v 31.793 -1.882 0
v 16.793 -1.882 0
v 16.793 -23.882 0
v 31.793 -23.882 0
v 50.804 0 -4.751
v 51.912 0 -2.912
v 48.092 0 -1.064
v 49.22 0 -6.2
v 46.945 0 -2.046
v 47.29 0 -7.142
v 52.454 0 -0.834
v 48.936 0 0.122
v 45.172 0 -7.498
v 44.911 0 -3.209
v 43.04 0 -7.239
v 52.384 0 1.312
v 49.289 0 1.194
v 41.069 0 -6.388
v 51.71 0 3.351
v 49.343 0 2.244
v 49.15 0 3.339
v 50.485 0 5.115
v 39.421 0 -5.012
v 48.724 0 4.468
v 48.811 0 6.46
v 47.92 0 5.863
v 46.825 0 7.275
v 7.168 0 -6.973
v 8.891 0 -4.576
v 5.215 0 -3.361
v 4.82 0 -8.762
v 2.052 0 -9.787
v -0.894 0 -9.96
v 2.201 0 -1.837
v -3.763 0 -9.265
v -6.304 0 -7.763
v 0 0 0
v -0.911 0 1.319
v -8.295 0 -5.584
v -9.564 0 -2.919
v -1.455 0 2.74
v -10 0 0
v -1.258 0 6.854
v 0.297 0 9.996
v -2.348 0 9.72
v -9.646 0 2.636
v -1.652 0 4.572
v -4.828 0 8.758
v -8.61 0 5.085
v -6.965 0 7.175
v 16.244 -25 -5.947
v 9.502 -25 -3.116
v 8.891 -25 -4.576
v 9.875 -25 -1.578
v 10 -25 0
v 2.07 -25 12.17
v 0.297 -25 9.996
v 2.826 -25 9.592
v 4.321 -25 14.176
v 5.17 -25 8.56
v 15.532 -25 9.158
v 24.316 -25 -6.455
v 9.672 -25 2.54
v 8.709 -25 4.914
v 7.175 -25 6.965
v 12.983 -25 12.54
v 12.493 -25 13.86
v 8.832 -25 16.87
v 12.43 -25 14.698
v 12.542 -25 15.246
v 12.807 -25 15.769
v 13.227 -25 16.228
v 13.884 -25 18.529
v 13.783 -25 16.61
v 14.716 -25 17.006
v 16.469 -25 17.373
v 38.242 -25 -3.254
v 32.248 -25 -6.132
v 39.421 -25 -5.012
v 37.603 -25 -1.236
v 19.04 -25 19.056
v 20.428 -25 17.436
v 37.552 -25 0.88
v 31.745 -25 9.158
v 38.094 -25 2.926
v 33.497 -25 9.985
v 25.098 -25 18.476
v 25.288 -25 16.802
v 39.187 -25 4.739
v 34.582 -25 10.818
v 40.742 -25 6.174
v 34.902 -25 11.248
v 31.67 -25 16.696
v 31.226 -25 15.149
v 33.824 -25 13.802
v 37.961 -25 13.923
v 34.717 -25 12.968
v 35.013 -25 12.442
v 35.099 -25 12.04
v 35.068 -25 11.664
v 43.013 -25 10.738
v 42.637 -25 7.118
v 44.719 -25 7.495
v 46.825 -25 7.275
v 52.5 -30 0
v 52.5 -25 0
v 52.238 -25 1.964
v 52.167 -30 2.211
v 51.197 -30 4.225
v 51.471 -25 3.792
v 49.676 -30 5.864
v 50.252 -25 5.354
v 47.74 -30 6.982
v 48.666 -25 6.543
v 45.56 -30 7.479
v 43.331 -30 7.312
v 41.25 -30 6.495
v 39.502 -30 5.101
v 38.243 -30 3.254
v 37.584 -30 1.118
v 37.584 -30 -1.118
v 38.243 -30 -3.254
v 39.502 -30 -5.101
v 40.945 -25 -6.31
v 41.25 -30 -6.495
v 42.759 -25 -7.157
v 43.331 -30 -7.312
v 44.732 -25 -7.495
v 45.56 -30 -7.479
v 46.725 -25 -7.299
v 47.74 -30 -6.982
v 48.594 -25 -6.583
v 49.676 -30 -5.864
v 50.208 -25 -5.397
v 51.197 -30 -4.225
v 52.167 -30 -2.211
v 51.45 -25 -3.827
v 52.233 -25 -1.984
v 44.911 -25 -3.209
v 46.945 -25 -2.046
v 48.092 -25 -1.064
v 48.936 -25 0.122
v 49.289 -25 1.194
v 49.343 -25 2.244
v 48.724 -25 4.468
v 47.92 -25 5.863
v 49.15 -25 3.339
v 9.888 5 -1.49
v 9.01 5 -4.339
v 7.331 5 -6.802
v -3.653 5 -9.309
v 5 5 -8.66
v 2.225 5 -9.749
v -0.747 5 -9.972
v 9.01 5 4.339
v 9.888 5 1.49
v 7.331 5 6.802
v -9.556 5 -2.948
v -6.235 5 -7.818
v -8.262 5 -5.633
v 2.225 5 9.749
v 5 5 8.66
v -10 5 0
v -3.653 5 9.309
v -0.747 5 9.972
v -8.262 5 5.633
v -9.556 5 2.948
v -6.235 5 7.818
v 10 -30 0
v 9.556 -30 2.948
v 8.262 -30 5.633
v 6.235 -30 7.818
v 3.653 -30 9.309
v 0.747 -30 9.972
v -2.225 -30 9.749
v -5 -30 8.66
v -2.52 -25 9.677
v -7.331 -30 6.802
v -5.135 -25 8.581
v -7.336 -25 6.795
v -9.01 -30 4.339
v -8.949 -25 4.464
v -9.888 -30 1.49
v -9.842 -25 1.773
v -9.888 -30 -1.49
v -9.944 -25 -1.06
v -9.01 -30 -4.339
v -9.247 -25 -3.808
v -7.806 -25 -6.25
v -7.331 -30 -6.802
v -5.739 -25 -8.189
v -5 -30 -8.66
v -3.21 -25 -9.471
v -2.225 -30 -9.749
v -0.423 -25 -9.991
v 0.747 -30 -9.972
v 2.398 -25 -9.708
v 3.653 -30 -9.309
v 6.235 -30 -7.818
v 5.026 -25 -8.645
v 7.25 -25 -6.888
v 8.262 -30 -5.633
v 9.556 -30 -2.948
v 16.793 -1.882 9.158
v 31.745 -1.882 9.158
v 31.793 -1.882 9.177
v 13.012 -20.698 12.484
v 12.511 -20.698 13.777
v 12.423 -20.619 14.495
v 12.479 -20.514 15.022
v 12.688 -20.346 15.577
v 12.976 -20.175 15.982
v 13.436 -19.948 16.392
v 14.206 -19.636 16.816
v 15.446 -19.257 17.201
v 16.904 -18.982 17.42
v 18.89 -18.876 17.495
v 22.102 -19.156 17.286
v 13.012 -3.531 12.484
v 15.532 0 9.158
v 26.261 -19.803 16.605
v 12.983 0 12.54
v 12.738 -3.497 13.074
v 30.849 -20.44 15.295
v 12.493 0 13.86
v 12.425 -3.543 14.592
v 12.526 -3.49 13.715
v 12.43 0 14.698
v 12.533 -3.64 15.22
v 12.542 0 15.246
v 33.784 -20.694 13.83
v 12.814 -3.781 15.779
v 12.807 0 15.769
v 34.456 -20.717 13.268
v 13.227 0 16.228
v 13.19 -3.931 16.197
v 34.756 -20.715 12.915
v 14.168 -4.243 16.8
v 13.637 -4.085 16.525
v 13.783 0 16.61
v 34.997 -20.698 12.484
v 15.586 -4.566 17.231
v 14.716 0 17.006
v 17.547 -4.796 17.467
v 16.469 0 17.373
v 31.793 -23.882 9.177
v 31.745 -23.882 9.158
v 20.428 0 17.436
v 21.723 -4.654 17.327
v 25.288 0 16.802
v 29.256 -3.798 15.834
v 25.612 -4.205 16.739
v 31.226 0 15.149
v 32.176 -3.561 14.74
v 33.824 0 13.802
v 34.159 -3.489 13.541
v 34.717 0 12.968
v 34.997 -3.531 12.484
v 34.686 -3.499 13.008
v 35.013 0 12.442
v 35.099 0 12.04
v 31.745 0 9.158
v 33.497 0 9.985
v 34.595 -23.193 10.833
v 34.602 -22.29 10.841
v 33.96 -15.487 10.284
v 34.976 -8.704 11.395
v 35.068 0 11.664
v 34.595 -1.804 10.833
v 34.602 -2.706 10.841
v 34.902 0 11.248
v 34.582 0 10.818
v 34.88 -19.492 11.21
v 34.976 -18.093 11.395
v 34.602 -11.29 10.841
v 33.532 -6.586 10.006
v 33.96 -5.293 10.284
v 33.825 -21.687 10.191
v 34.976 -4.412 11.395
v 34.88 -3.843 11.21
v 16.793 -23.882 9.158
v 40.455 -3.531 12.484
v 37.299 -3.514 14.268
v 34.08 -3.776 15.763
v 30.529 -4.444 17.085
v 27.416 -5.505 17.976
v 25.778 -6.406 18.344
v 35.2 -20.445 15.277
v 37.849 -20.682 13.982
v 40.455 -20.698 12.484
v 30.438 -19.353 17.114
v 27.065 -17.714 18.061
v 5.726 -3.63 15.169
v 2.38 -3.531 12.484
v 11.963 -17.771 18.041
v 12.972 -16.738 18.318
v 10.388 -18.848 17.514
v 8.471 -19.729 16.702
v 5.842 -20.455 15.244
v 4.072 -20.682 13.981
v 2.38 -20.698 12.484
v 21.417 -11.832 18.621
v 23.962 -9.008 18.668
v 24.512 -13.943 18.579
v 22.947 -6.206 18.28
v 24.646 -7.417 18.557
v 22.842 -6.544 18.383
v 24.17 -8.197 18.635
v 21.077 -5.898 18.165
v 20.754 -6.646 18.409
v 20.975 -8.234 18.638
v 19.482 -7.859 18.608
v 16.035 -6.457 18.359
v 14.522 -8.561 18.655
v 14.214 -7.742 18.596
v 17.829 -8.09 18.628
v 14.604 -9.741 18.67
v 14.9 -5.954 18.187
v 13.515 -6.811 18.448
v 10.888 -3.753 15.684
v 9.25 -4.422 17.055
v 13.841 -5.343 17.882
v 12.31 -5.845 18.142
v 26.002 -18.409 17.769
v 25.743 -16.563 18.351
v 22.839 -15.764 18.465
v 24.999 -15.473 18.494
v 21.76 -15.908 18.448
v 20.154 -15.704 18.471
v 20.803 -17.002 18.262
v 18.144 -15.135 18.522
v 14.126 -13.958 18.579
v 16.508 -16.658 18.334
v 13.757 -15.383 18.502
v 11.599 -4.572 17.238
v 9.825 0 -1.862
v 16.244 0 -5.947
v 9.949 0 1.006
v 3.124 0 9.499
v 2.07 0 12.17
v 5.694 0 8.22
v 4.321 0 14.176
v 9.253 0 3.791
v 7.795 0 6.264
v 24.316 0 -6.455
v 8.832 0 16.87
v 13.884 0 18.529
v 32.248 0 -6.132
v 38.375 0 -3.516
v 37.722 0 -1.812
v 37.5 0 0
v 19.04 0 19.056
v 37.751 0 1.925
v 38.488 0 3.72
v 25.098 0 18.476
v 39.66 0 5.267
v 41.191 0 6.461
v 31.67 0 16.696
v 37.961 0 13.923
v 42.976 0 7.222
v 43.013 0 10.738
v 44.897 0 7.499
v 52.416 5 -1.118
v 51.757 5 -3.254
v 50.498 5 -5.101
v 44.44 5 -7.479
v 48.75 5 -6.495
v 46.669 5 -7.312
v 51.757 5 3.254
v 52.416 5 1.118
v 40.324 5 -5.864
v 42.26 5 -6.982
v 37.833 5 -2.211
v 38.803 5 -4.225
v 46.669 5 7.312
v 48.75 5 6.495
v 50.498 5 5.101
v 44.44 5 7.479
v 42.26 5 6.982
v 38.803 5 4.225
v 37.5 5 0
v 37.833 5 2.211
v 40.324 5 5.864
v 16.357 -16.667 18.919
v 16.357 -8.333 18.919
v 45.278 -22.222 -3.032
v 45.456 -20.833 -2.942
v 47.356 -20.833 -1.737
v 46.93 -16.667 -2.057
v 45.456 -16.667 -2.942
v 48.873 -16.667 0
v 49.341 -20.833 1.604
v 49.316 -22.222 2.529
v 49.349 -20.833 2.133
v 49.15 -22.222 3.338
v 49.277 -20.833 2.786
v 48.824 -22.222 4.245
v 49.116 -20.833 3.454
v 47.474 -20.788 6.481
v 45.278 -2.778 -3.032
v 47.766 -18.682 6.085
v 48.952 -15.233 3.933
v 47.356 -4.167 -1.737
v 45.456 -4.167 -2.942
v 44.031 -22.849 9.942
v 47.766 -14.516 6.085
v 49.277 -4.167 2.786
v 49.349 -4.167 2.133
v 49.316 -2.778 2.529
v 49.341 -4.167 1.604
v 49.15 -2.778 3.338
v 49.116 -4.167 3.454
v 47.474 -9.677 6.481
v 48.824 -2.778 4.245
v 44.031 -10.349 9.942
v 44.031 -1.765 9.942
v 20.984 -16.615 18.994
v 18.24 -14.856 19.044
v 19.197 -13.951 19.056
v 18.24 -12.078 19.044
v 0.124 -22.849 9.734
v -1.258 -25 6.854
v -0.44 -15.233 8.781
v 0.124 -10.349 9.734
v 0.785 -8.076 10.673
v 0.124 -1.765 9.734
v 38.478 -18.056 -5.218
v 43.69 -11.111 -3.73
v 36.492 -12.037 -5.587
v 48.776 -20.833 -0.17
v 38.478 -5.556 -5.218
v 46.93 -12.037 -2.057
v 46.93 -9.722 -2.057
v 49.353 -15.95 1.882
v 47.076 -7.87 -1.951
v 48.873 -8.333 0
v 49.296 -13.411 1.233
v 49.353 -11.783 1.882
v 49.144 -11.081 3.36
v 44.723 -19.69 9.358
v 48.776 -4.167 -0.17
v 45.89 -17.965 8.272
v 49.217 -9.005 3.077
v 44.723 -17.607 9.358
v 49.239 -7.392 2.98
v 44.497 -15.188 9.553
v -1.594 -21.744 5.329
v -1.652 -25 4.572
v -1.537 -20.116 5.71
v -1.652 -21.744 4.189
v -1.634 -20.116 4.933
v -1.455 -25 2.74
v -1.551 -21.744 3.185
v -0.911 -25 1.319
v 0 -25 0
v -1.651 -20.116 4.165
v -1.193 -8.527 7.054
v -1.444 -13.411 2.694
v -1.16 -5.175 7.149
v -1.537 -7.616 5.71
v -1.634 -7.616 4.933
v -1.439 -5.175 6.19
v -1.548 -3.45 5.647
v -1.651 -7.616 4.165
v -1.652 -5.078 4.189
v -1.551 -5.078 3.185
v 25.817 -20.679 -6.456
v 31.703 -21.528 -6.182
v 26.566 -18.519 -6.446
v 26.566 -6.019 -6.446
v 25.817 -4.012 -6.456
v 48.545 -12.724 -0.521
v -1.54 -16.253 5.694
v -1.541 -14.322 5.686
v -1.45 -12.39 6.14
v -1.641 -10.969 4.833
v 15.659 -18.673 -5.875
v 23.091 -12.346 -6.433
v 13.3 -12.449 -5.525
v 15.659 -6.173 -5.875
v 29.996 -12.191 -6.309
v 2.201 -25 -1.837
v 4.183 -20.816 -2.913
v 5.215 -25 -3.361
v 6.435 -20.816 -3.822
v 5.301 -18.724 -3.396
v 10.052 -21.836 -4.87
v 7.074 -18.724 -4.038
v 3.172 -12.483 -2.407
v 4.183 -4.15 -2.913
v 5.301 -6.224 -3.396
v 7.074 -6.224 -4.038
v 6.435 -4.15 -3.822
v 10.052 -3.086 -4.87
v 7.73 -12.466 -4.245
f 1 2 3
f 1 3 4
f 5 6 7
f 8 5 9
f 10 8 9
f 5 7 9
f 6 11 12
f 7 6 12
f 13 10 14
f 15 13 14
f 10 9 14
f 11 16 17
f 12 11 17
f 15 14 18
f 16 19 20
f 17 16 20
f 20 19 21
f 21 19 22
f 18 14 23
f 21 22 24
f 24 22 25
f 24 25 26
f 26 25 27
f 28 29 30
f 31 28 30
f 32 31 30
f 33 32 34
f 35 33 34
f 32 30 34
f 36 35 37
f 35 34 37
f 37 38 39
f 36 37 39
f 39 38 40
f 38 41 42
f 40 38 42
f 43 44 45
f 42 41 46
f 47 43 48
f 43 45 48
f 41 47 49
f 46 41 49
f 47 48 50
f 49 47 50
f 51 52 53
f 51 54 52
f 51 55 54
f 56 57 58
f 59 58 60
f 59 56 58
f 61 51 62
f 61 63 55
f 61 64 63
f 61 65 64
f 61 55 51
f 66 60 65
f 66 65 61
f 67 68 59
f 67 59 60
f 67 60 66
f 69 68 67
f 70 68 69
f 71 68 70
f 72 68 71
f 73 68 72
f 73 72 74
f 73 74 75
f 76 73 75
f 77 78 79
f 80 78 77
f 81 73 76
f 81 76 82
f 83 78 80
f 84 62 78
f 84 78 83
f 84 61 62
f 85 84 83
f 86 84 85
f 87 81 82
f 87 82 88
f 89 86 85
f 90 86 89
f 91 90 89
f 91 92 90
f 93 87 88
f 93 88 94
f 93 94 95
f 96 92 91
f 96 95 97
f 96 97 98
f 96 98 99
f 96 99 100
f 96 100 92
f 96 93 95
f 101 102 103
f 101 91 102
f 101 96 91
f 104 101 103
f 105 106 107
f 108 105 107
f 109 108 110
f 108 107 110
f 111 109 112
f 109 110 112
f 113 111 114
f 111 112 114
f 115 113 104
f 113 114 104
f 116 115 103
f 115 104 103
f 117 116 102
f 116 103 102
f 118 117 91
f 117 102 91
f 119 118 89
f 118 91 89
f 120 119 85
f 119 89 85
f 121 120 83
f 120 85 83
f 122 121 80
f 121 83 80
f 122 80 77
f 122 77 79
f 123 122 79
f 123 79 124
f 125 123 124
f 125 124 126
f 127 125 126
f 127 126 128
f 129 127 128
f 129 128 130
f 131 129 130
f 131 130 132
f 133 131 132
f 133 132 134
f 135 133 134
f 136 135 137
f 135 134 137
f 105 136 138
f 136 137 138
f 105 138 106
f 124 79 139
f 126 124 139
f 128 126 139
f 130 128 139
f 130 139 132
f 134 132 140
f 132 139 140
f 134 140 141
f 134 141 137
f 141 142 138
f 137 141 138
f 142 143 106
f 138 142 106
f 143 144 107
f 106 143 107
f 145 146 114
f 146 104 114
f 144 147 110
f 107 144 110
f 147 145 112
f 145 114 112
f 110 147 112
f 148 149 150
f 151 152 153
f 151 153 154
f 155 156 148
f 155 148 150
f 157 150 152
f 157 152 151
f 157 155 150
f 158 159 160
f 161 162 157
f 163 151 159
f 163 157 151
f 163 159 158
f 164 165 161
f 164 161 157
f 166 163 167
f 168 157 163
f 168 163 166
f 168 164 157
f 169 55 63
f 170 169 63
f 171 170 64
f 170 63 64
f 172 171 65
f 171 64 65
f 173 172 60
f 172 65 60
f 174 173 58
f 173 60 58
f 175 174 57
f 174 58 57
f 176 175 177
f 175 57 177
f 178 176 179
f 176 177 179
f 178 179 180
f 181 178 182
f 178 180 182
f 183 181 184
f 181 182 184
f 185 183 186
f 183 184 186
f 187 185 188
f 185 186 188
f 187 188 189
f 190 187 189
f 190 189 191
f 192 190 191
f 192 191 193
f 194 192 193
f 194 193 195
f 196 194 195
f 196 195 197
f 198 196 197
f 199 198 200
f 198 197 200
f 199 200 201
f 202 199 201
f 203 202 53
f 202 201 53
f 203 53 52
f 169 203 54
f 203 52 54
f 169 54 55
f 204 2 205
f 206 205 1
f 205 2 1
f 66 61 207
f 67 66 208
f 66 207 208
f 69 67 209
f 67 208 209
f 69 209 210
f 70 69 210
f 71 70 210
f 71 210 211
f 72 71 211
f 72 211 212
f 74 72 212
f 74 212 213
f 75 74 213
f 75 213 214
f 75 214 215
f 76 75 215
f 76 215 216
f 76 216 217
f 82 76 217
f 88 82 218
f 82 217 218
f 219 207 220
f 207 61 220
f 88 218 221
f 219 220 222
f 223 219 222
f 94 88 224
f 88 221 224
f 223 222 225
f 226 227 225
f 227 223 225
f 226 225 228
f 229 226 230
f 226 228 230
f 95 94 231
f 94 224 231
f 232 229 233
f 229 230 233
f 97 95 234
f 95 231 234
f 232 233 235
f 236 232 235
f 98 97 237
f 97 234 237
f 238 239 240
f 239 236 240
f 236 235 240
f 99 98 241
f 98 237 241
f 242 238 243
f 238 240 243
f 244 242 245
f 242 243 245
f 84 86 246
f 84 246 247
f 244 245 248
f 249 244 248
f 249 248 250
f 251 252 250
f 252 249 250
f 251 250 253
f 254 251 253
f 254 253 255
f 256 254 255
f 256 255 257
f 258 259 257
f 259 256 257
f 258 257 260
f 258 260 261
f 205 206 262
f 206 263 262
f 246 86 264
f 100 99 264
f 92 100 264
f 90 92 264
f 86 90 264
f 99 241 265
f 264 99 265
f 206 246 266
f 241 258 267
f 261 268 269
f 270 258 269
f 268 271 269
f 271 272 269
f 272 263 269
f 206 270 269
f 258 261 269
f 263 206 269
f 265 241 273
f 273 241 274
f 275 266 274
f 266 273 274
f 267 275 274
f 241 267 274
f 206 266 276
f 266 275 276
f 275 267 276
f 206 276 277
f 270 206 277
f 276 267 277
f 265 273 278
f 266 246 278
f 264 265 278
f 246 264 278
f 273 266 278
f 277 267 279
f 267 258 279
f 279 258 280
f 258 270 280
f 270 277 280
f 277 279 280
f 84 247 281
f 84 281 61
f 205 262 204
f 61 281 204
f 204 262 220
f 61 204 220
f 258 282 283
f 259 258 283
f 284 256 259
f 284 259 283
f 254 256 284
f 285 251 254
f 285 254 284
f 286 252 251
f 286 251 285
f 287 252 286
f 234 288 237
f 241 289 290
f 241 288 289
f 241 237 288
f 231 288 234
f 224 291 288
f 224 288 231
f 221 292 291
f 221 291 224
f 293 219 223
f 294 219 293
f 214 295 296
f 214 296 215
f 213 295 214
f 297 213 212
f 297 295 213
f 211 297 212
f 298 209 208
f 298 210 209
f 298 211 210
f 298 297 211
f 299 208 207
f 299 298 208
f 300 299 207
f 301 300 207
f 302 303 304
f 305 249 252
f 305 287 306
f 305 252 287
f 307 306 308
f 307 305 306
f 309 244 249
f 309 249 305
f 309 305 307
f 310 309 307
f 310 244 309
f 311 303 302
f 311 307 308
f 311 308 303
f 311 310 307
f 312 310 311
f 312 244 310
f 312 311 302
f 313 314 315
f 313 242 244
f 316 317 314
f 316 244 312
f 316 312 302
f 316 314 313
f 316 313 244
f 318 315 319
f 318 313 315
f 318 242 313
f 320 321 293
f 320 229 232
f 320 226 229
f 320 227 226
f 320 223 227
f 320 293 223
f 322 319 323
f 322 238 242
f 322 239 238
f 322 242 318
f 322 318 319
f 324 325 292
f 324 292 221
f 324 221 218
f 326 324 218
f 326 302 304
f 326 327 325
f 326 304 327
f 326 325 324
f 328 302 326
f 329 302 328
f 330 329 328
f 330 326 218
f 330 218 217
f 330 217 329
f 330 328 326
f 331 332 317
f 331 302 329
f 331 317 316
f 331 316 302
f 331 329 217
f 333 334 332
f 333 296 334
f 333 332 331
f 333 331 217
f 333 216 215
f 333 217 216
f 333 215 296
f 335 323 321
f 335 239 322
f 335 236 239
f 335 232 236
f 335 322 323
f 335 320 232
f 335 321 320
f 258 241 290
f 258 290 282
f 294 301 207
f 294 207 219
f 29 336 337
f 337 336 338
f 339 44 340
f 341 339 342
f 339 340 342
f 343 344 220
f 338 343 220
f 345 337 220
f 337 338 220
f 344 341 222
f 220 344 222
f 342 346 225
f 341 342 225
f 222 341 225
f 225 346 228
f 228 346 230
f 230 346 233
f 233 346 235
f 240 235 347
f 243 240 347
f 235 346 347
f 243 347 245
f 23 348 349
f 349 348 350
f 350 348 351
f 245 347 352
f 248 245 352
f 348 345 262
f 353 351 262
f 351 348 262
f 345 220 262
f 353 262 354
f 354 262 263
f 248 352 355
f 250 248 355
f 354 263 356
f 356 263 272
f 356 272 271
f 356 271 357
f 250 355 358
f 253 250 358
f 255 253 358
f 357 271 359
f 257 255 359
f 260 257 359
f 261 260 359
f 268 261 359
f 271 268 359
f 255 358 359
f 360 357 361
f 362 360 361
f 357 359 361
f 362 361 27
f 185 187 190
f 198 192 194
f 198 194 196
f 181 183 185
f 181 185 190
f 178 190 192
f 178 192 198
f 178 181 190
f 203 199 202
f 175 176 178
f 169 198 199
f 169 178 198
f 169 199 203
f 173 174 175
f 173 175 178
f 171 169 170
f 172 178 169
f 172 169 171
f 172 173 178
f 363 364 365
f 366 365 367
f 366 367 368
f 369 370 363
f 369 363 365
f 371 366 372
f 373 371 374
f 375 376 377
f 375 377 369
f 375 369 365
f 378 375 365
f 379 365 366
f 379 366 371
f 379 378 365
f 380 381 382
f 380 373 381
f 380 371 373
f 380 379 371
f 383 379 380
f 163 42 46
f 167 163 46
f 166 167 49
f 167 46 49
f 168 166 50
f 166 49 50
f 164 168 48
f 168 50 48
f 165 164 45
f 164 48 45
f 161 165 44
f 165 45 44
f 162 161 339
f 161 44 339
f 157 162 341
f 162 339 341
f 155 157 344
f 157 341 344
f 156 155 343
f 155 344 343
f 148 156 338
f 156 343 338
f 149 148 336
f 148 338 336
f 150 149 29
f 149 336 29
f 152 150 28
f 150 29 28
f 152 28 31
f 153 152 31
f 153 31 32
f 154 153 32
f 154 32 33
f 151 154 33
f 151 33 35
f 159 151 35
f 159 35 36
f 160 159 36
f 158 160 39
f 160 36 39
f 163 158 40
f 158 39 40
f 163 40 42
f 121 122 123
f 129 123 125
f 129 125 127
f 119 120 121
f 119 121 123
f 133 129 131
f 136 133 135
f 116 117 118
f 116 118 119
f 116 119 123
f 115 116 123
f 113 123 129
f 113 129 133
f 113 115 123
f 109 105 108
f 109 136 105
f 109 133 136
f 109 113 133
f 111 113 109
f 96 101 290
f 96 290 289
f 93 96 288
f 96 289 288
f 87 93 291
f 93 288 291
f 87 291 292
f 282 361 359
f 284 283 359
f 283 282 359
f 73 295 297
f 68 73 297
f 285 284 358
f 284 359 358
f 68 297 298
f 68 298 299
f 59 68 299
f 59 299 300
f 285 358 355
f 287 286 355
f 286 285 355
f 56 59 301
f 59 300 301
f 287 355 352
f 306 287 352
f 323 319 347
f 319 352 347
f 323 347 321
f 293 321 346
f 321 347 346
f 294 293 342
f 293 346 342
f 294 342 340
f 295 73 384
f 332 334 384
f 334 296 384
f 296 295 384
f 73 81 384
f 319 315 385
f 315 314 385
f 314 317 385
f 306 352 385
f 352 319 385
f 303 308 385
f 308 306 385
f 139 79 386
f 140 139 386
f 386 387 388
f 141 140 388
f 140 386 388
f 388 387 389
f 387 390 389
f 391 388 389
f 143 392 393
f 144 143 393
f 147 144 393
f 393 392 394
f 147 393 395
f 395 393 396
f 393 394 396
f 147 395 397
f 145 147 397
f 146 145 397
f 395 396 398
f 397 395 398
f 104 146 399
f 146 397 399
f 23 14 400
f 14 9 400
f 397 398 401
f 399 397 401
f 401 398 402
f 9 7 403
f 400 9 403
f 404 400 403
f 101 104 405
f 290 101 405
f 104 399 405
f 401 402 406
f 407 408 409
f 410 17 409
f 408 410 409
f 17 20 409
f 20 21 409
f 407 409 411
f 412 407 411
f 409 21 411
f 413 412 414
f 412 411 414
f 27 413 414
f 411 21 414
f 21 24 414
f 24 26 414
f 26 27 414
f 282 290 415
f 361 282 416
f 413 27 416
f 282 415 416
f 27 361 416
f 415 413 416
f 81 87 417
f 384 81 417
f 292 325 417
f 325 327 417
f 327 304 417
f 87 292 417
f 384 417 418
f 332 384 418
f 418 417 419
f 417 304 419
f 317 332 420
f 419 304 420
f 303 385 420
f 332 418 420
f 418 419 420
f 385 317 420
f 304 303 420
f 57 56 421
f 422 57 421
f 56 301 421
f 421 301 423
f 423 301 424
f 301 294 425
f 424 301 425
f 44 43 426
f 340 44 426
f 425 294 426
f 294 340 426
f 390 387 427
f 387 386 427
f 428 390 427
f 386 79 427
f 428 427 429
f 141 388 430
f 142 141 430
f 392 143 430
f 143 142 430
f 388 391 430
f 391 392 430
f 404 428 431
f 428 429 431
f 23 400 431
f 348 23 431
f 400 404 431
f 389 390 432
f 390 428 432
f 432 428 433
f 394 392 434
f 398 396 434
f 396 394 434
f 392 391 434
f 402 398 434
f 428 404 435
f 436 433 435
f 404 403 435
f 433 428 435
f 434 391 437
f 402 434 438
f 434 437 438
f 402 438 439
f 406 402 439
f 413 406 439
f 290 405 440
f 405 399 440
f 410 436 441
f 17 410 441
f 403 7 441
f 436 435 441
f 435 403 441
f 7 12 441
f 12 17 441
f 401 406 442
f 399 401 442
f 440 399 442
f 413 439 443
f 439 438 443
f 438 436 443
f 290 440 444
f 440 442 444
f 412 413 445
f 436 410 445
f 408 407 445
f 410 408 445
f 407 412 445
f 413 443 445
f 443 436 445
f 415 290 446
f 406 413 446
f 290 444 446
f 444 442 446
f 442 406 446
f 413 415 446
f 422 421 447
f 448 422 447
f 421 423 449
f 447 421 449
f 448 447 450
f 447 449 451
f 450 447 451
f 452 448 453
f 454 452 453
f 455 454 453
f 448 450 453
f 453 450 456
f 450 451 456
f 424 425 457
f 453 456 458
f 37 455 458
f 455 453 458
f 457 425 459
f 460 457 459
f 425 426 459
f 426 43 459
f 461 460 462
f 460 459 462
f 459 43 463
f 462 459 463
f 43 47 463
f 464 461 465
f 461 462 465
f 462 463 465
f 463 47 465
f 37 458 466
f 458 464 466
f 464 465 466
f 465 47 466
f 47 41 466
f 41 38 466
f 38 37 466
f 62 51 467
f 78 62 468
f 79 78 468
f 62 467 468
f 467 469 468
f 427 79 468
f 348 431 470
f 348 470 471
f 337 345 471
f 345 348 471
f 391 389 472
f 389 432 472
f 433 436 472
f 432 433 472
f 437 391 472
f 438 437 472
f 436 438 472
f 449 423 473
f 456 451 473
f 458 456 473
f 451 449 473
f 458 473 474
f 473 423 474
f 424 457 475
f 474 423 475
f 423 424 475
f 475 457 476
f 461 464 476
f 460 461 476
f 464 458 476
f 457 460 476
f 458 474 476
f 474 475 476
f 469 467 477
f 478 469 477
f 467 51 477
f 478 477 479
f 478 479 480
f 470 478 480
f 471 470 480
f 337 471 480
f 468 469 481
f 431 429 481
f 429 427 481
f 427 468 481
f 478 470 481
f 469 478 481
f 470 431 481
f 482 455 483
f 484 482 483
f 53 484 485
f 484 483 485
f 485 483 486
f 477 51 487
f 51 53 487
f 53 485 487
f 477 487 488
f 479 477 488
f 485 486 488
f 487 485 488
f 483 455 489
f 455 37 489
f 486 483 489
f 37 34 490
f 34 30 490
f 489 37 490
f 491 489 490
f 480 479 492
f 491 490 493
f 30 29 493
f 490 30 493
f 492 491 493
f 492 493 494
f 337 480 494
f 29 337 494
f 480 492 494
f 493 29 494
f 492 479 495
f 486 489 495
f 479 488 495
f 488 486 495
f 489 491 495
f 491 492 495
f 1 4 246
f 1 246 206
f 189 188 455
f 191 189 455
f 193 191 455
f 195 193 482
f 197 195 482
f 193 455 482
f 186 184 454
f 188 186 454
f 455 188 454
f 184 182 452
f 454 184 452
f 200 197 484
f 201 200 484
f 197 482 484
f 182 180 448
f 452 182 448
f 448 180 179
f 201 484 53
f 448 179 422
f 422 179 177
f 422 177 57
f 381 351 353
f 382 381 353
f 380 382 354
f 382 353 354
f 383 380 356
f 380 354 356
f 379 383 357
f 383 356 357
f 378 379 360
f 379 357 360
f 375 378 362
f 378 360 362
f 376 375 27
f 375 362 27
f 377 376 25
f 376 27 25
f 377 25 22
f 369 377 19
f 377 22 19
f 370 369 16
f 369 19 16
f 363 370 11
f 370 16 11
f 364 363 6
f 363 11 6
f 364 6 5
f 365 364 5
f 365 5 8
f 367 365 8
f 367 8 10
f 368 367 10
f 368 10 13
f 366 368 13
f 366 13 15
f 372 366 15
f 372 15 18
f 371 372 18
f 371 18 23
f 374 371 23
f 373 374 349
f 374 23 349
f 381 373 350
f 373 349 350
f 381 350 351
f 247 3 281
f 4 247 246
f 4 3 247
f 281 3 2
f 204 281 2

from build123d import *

# Parameters (mm, degrees)
F1_DEPTH  = 25
F2_R      = 10
F2_R_2    = 7.5
F3_DEPTH  = 5
F4_R      = 10
F4_R_2    = 7.5
F5_DEPTH  = 5
F7_DEPTH  = 25
F9_DEPTH  = 50
F10_W     = 15
F10_H     = 22
F11_DEPTH = 11.7


with BuildPart() as f1:
    # F0 (on Front) → F1 (new body)
    with BuildSketch(Plane.XZ):
        with BuildLine():
            add(Edge.make_bspline(
                [(0, 0), (7.7729099033, -8.9017739988), (76.5515985722, -7.8056866995), (14.944270392, 31.3527554007), (-5.5602967015, 6.3678217319), (0, 0)],
                knots=[0, 0, 0, 0, 0.3856996923, 0.7240924244, 1, 1, 1, 1], degree=3))
        make_face()
    extrude(amount=F1_DEPTH)

    # F2 (on face) → F3 (join)
    with BuildSketch(Plane(origin=(0, 0, 0), x_dir=(-1, 0, 0), z_dir=(0, 1, 0))):
        Circle(F2_R)
        with Locations((-45, 0)):
            Circle(F2_R_2)
    extrude(amount=F3_DEPTH)

    # F4 (on face) → F5 (join)
    with BuildSketch(Plane.XZ.offset(25)):
        Circle(F4_R)
        with Locations((45, 0)):
            Circle(F4_R_2)
    extrude(amount=F5_DEPTH)

    # F6 (on face) → F7 (cut)
    with BuildSketch(Plane(origin=(0, 0, 0), x_dir=(-1, 0, 0), z_dir=(0, 1, 0))):
        with BuildLine():
            add(Edge.make_bspline(
                [(-15.5320151279, 9.157834348), (-8.4285214161, 16.6821450751), (-21.5056969383, 19.7605291958), (-40.3879305064, 12.5258969863), (-31.7447283103, 9.157834348)],
                knots=[0, 0, 0, 0, 0.4795568401, 1, 1, 1, 1], degree=3))
            Line((-31.7447283103, 9.157834348), (-15.5320151279, 9.157834348))
        make_face()
    extrude(amount=-F7_DEPTH, mode=Mode.SUBTRACT)

    # F8 (on Right) → F9 (cut)
    with BuildSketch(Plane.YZ):
        with BuildLine():
            add(Edge.make_bspline(
                [(-3.5305038338, 12.4840607559), (-3.0124981012, 19.2546628614), (-11.8276355966, 18.1731187054), (-21.0525599776, 18.8733435584), (-20.6982006042, 12.4840607559)],
                knots=[0, 0, 0, 0, 0.4945566661, 1, 1, 1, 1], degree=3))
            Line((-20.6982006042, 12.4840607559), (-3.5305038338, 12.4840607559))
        make_face()
    extrude(amount=F9_DEPTH, mode=Mode.SUBTRACT)

    # F10 (on Top) → F11 (cut)
    with BuildSketch(Plane.XY):
        with Locations((24.2926669866, -12.8819355741)):
            Rectangle(F10_W, F10_H)
    extrude(amount=F11_DEPTH, mode=Mode.SUBTRACT)


solid = f1.part
